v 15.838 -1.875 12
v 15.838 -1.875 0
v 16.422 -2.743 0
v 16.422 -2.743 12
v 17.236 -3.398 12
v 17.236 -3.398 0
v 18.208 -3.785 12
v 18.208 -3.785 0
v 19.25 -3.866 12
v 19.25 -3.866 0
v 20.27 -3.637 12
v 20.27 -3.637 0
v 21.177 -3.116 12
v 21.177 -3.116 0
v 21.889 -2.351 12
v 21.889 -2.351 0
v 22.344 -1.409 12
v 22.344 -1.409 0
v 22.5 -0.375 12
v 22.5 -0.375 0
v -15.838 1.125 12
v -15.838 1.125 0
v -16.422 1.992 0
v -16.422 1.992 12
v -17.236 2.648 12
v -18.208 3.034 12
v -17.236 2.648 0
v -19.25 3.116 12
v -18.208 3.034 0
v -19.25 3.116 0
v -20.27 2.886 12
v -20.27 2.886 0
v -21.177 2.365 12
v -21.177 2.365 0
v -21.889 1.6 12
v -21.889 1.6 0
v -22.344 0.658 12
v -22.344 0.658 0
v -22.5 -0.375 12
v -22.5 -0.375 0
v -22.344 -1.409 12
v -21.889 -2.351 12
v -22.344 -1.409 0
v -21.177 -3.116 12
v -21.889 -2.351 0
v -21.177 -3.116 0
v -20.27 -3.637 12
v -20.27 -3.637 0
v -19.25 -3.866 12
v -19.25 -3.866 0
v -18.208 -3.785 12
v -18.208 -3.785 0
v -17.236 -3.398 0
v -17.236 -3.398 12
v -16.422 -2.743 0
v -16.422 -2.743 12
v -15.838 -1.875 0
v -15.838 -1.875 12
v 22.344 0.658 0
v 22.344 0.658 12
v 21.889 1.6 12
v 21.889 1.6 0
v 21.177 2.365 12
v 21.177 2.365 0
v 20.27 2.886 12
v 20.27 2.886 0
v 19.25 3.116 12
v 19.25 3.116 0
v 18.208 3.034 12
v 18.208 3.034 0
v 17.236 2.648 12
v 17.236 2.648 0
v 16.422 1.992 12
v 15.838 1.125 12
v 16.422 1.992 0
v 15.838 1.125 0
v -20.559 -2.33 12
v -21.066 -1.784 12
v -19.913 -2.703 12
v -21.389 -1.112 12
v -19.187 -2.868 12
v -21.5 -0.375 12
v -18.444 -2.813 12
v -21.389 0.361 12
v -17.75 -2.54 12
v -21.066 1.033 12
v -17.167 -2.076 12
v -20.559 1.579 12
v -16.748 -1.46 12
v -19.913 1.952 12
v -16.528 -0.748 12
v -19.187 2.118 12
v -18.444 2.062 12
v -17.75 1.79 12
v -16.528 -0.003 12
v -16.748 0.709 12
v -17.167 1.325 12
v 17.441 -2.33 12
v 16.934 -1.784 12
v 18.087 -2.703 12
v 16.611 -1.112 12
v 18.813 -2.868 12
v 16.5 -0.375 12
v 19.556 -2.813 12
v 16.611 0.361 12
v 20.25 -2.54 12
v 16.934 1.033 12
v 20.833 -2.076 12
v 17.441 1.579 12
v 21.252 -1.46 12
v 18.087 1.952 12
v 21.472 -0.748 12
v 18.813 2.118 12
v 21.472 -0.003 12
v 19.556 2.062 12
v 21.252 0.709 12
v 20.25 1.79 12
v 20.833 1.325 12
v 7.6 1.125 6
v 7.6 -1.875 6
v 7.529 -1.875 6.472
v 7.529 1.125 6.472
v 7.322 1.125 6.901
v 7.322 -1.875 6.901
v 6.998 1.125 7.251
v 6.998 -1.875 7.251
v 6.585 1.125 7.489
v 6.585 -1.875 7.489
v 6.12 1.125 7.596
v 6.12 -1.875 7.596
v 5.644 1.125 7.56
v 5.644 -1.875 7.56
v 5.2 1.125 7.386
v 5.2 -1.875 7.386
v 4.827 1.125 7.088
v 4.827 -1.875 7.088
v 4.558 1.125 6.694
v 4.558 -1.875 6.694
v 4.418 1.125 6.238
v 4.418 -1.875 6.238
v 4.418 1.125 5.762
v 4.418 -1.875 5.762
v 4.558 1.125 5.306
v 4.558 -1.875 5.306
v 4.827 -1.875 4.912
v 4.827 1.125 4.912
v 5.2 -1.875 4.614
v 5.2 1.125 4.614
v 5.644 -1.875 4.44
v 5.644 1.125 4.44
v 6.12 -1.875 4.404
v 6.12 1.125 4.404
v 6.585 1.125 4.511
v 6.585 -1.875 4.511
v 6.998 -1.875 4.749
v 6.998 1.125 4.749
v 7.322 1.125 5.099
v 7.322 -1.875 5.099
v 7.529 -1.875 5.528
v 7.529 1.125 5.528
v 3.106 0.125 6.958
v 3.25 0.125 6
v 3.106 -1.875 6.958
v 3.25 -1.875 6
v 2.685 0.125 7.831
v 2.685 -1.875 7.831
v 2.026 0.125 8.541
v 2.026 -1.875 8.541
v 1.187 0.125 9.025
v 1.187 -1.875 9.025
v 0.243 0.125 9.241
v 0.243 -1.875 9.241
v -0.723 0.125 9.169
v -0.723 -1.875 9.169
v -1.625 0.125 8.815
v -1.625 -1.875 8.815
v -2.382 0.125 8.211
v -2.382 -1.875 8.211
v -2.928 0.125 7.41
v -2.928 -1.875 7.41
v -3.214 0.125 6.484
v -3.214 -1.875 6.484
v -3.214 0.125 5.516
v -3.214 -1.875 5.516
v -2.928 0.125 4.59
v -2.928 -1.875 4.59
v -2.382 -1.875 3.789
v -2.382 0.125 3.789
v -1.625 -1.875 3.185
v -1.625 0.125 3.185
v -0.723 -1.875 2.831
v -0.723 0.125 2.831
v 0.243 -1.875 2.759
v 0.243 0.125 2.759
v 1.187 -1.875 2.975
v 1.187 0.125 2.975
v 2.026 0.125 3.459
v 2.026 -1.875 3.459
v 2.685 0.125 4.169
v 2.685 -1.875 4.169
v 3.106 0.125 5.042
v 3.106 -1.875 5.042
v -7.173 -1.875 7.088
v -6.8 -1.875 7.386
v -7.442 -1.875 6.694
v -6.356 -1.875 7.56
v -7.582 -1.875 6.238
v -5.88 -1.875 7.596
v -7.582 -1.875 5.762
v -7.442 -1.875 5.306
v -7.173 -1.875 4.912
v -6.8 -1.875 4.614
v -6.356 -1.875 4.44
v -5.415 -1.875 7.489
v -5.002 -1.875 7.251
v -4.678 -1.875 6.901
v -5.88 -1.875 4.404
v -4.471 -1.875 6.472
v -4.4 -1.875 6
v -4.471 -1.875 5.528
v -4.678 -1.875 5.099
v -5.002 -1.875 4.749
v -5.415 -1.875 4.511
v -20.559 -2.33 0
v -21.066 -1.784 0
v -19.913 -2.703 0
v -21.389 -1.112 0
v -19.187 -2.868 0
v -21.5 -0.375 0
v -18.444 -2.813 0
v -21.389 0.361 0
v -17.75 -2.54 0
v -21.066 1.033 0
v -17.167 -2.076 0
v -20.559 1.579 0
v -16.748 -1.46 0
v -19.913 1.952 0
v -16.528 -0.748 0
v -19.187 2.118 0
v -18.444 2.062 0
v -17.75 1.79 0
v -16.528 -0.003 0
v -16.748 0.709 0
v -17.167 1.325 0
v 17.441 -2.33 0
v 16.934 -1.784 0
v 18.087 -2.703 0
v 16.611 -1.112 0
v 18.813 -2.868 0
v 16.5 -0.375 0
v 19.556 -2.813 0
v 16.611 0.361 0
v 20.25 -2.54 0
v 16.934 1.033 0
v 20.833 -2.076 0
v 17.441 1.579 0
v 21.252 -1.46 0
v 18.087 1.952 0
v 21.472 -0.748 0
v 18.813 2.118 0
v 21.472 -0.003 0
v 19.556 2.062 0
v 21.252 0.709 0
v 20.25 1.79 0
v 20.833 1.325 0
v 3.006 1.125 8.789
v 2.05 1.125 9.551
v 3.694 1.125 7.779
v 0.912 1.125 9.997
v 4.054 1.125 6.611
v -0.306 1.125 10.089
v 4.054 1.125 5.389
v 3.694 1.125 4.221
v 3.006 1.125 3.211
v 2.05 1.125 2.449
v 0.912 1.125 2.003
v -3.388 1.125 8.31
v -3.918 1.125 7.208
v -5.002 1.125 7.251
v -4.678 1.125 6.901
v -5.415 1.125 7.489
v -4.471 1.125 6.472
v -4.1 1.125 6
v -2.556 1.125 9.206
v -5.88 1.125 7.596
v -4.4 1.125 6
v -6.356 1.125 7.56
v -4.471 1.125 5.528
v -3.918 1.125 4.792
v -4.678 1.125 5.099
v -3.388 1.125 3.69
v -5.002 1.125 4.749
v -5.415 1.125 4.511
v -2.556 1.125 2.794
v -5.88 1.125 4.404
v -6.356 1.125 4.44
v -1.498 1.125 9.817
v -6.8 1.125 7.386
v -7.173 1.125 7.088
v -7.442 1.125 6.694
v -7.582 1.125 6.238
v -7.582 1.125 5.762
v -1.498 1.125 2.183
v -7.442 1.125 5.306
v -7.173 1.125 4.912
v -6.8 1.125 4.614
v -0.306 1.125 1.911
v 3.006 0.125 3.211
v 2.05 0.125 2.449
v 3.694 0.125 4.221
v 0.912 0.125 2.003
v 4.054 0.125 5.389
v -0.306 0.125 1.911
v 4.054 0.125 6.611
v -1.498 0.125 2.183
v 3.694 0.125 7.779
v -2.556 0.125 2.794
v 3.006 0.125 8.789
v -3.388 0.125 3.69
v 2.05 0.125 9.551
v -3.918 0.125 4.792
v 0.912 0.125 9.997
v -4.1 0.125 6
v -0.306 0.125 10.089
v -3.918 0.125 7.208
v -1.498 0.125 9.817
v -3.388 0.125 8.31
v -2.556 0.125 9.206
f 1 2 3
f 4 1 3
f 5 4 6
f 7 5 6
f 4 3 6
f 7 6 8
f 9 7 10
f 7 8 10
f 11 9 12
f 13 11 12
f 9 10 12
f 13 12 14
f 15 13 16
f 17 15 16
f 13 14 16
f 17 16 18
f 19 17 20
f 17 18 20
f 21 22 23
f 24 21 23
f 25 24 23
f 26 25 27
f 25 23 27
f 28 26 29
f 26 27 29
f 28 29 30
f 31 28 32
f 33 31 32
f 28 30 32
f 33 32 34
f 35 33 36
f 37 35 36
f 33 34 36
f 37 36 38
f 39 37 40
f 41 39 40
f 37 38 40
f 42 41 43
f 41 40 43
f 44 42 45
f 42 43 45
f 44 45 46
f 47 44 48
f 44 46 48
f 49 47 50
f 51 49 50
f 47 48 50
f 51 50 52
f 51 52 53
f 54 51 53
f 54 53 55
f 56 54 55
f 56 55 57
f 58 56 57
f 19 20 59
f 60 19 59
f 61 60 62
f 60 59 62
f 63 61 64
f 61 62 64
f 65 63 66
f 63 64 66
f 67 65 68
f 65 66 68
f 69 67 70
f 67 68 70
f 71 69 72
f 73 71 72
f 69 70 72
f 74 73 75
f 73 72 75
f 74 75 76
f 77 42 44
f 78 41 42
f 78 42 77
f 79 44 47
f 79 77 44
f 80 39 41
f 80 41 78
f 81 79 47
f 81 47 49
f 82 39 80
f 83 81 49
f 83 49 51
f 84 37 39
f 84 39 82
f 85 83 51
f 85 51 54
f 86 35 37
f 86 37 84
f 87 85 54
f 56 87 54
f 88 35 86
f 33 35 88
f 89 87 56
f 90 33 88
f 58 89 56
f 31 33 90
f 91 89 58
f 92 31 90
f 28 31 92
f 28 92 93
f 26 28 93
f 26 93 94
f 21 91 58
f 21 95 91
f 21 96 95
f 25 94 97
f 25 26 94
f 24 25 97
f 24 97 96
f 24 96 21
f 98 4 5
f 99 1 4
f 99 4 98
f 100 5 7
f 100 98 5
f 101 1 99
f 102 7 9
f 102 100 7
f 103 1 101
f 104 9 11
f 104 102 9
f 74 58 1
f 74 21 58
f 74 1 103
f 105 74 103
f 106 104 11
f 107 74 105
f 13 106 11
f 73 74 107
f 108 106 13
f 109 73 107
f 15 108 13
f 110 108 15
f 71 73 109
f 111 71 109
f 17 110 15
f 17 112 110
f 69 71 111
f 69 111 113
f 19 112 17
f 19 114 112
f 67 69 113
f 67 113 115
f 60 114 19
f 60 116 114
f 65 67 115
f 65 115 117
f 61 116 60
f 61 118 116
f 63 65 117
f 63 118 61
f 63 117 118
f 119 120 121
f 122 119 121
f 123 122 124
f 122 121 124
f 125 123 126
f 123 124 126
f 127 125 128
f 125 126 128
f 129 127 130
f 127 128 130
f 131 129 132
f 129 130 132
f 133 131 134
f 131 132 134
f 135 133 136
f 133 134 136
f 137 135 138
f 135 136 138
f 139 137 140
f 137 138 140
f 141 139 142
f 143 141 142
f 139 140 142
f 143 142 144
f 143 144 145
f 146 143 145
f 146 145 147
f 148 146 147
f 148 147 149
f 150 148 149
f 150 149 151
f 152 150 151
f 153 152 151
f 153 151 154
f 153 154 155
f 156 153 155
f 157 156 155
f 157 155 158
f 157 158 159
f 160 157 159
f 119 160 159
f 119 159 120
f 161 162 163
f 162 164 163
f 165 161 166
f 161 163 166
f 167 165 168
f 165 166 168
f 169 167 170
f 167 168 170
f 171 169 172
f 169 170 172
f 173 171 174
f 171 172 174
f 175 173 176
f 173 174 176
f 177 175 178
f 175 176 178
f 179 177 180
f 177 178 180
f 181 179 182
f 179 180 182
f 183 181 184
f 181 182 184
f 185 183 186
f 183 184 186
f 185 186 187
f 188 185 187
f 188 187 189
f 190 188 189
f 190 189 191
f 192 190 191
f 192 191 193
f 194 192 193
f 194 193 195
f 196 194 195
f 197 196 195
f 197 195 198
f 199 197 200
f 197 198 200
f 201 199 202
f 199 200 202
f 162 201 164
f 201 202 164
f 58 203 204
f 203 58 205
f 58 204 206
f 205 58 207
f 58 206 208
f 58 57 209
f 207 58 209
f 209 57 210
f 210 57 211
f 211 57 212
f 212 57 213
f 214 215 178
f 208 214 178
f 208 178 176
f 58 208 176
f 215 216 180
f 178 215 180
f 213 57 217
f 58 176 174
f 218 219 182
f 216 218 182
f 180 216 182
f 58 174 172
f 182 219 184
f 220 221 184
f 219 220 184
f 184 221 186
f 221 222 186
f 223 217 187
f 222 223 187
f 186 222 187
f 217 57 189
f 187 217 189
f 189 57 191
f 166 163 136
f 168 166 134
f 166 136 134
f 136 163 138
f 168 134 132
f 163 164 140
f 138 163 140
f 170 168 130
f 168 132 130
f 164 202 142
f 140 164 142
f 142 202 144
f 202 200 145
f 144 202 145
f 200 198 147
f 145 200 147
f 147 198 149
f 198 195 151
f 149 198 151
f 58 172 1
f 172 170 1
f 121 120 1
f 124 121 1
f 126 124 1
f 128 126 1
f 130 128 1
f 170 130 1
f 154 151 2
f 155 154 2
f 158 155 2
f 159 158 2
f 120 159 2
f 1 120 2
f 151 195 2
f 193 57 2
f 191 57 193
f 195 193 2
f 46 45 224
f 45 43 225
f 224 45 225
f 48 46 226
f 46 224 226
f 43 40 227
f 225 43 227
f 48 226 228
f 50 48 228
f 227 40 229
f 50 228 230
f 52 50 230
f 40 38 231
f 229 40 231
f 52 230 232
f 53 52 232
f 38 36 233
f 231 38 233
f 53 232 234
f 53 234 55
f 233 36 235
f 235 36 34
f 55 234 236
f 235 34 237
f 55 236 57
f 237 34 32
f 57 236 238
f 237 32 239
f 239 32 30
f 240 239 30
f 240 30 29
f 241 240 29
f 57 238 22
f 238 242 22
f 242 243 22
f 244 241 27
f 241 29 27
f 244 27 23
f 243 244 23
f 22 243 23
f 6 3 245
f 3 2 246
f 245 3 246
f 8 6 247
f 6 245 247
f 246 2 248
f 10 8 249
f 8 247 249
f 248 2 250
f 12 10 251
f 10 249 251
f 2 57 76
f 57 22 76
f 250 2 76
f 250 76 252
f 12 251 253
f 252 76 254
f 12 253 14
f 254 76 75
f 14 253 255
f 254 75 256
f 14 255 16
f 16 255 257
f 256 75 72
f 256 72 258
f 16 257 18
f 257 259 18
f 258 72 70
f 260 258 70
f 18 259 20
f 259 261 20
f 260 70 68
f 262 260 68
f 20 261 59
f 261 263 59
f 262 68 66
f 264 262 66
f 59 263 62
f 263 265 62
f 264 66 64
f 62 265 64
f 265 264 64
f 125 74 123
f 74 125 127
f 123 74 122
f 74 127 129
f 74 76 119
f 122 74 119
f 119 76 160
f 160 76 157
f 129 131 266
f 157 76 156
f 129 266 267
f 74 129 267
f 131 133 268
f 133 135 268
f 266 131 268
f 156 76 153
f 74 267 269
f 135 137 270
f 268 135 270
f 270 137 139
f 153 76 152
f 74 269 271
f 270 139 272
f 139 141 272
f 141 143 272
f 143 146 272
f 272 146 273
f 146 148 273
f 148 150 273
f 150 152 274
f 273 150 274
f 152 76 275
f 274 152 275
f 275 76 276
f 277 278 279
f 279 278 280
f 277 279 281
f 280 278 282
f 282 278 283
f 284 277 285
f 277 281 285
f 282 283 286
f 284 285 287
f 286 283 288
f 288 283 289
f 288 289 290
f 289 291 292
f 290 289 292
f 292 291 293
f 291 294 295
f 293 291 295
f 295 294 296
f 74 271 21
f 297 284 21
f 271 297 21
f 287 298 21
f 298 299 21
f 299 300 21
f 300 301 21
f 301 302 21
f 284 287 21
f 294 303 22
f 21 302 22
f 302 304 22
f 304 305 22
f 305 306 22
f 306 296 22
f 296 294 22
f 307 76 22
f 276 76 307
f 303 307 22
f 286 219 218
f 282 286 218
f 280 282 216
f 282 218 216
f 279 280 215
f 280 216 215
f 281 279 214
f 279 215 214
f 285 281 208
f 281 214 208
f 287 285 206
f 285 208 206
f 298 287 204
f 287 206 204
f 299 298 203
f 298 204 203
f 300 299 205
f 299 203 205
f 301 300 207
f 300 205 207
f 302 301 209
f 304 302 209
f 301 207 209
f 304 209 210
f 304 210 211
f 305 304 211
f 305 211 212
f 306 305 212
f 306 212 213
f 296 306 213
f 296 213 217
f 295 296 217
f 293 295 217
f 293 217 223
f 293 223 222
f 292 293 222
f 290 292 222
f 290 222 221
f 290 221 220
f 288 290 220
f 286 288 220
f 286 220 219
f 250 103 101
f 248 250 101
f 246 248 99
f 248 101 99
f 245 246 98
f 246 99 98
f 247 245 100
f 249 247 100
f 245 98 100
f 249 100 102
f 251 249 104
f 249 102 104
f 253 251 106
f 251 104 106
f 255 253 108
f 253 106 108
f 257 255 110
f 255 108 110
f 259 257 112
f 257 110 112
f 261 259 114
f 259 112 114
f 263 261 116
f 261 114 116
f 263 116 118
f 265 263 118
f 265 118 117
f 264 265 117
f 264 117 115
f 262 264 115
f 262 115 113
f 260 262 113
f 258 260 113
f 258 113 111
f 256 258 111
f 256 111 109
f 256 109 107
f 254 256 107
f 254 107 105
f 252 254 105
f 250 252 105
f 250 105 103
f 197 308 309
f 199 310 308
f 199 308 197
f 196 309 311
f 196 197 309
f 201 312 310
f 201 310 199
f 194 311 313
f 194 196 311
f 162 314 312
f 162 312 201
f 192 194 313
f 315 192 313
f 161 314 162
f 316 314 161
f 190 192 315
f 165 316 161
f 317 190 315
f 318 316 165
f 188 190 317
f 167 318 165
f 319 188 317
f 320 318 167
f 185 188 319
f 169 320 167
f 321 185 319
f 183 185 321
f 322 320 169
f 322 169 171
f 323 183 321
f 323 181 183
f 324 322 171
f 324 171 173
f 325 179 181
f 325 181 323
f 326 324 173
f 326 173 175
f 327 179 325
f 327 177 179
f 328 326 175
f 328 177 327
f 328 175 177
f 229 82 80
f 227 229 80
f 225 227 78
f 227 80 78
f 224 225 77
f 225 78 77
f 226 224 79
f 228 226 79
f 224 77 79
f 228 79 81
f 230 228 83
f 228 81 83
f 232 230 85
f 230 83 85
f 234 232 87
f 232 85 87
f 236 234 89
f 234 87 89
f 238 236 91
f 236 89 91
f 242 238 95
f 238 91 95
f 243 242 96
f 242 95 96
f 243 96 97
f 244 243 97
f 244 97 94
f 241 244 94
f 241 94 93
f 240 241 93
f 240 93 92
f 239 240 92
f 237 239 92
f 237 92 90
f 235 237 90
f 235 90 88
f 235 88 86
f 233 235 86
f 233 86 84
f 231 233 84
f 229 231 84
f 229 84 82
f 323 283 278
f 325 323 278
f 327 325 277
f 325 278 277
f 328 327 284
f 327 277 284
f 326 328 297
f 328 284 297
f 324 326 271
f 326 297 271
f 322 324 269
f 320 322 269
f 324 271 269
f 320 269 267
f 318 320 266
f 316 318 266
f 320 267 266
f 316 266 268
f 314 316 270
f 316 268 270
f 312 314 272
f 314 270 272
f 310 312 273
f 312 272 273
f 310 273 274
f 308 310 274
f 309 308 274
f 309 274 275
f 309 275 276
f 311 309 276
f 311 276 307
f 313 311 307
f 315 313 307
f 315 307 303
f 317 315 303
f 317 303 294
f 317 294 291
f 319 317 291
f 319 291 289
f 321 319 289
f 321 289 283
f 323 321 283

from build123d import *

# Parameters (mm, degrees)
F1_DEPTH       = 12
F2_D           = 5
F2_DEPTH       = 15
F2_TIP         = 1.5021515476
F3_D           = 5
F3_DEPTH       = 15
F3_TIP         = 1.5021515476
F5_D           = 6.5
F5_DEPTH       = 10
F5_CBORE_D     = 8.2
F5_CBORE_DEPTH = 1
F5_TIP         = 1.9527970118
F6_D           = 3.2
F6_DEPTH       = 15
F6_TIP         = 0.9613769904
F7_D           = 3.2
F7_DEPTH       = 15
F7_TIP         = 0.9613769904


# Not quite as in the source:
# - a feature names something its author has since deleted; it is built from what else it names


with BuildPart() as f1:
    # F0 (on Top) → F1 (new body)
    with BuildSketch(Plane.XY):
        with BuildLine():
            Line((-19, -1.8754155822), (-19, 1.1245844178))
            Line((-19, 1.1245844178), (-15.8377223398, 1.1245844178))
            ThreePointArc((-15.8377223398, 1.1245844178), (-22.5, -0.3754155822), (-15.8377223398, -1.8754155822))
            Line((-15.8377223398, -1.8754155822), (-19, -1.8754155822))
        make_face()
        with BuildLine():
            Line((-15.8377223398, 1.1245844178), (-19, 1.1245844178))
            Line((-19, 1.1245844178), (-19, -1.8754155822))
            Line((-19, -1.8754155822), (-15.8377223398, -1.8754155822))
            ThreePointArc((-15.8377223398, -1.8754155822), (-15.5854742781, -1.144189993), (-15.5, -0.3754155822))
            ThreePointArc((-15.5, -0.3754155822), (-15.5854742781, 0.3933588286), (-15.8377223398, 1.1245844178))
        make_face()
        with BuildLine():
            Line((15.8377223398, 1.1245844178), (-15.8377223398, 1.1245844178))
            ThreePointArc((-15.8377223398, 1.1245844178), (-15.5854742781, 0.3933588286), (-15.5, -0.3754155822))
            ThreePointArc((-15.5, -0.3754155822), (-15.5854742781, -1.144189993), (-15.8377223398, -1.8754155822))
            Line((-15.8377223398, -1.8754155822), (15.8377223398, -1.8754155822))
            ThreePointArc((15.8377223398, -1.8754155822), (15.5, -0.3754155822), (15.8377223398, 1.1245844178))
        make_face()
        with BuildLine():
            ThreePointArc((22.5, -0.3754155822), (19.7687744108, 3.0391101397), (15.8377223398, 1.1245844178))
            Line((15.8377223398, 1.1245844178), (19, 1.1245844178))
            Line((19, 1.1245844178), (19, -1.8754155822))
            Line((19, -1.8754155822), (15.8377223398, -1.8754155822))
            ThreePointArc((15.8377223398, -1.8754155822), (19.7687744108, -3.7899413041), (22.5, -0.3754155822))
        make_face()
        with BuildLine():
            Line((19, 1.1245844178), (15.8377223398, 1.1245844178))
            ThreePointArc((15.8377223398, 1.1245844178), (15.5, -0.3754155822), (15.8377223398, -1.8754155822))
            Line((15.8377223398, -1.8754155822), (19, -1.8754155822))
            Line((19, -1.8754155822), (19, 1.1245844178))
        make_face()
    extrude(amount=F1_DEPTH)

    # F2
    with Locations(Plane(origin=(0, 0, 0), x_dir=(1, 0, 0), z_dir=(0, 0, -1))):
        with Locations((19, 0.3754155822)):
            Hole(F2_D / 2, depth=F2_DEPTH)
            with Locations((0, 0, -(F2_DEPTH + F2_TIP / 2))):  # 118° drill point
                Cone(0, F2_D / 2, F2_TIP, mode=Mode.SUBTRACT)

    # F3
    with Locations(Plane(origin=(0, 0, 0), x_dir=(1, 0, 0), z_dir=(0, 0, -1))):
        with Locations((-19, 0.3754155822)):
            Hole(F3_D / 2, depth=F3_DEPTH)
            with Locations((0, 0, -(F3_DEPTH + F3_TIP / 2))):  # 118° drill point
                Cone(0, F3_D / 2, F3_TIP, mode=Mode.SUBTRACT)

    # F5
    with Locations(Plane(origin=(0, 1.1245844178, 0), x_dir=(-1, 0, 0), z_dir=(0, 1, 0))):
        with Locations((0, 6)):
            CounterBoreHole(F5_D / 2, F5_CBORE_D / 2, F5_CBORE_DEPTH, depth=F5_DEPTH)
            with Locations((0, 0, -(F5_DEPTH + F5_TIP / 2))):  # 118° drill point
                Cone(0, F5_D / 2, F5_TIP, mode=Mode.SUBTRACT)

    # F6
    with Locations(Plane(origin=(0, 1.1245844178, 0), x_dir=(-1, 0, 0), z_dir=(0, 1, 0))):
        with Locations((-6, 6)):
            Hole(F6_D / 2, depth=F6_DEPTH)
            with Locations((0, 0, -(F6_DEPTH + F6_TIP / 2))):  # 118° drill point
                Cone(0, F6_D / 2, F6_TIP, mode=Mode.SUBTRACT)

    # F7
    with Locations(Plane(origin=(0, 1.1245844178, 0), x_dir=(-1, 0, 0), z_dir=(0, 1, 0))):
        with Locations((6, 6)):
            Hole(F7_D / 2, depth=F7_DEPTH)
            with Locations((0, 0, -(F7_DEPTH + F7_TIP / 2))):  # 118° drill point
                Cone(0, F7_D / 2, F7_TIP, mode=Mode.SUBTRACT)


solid = f1.part
